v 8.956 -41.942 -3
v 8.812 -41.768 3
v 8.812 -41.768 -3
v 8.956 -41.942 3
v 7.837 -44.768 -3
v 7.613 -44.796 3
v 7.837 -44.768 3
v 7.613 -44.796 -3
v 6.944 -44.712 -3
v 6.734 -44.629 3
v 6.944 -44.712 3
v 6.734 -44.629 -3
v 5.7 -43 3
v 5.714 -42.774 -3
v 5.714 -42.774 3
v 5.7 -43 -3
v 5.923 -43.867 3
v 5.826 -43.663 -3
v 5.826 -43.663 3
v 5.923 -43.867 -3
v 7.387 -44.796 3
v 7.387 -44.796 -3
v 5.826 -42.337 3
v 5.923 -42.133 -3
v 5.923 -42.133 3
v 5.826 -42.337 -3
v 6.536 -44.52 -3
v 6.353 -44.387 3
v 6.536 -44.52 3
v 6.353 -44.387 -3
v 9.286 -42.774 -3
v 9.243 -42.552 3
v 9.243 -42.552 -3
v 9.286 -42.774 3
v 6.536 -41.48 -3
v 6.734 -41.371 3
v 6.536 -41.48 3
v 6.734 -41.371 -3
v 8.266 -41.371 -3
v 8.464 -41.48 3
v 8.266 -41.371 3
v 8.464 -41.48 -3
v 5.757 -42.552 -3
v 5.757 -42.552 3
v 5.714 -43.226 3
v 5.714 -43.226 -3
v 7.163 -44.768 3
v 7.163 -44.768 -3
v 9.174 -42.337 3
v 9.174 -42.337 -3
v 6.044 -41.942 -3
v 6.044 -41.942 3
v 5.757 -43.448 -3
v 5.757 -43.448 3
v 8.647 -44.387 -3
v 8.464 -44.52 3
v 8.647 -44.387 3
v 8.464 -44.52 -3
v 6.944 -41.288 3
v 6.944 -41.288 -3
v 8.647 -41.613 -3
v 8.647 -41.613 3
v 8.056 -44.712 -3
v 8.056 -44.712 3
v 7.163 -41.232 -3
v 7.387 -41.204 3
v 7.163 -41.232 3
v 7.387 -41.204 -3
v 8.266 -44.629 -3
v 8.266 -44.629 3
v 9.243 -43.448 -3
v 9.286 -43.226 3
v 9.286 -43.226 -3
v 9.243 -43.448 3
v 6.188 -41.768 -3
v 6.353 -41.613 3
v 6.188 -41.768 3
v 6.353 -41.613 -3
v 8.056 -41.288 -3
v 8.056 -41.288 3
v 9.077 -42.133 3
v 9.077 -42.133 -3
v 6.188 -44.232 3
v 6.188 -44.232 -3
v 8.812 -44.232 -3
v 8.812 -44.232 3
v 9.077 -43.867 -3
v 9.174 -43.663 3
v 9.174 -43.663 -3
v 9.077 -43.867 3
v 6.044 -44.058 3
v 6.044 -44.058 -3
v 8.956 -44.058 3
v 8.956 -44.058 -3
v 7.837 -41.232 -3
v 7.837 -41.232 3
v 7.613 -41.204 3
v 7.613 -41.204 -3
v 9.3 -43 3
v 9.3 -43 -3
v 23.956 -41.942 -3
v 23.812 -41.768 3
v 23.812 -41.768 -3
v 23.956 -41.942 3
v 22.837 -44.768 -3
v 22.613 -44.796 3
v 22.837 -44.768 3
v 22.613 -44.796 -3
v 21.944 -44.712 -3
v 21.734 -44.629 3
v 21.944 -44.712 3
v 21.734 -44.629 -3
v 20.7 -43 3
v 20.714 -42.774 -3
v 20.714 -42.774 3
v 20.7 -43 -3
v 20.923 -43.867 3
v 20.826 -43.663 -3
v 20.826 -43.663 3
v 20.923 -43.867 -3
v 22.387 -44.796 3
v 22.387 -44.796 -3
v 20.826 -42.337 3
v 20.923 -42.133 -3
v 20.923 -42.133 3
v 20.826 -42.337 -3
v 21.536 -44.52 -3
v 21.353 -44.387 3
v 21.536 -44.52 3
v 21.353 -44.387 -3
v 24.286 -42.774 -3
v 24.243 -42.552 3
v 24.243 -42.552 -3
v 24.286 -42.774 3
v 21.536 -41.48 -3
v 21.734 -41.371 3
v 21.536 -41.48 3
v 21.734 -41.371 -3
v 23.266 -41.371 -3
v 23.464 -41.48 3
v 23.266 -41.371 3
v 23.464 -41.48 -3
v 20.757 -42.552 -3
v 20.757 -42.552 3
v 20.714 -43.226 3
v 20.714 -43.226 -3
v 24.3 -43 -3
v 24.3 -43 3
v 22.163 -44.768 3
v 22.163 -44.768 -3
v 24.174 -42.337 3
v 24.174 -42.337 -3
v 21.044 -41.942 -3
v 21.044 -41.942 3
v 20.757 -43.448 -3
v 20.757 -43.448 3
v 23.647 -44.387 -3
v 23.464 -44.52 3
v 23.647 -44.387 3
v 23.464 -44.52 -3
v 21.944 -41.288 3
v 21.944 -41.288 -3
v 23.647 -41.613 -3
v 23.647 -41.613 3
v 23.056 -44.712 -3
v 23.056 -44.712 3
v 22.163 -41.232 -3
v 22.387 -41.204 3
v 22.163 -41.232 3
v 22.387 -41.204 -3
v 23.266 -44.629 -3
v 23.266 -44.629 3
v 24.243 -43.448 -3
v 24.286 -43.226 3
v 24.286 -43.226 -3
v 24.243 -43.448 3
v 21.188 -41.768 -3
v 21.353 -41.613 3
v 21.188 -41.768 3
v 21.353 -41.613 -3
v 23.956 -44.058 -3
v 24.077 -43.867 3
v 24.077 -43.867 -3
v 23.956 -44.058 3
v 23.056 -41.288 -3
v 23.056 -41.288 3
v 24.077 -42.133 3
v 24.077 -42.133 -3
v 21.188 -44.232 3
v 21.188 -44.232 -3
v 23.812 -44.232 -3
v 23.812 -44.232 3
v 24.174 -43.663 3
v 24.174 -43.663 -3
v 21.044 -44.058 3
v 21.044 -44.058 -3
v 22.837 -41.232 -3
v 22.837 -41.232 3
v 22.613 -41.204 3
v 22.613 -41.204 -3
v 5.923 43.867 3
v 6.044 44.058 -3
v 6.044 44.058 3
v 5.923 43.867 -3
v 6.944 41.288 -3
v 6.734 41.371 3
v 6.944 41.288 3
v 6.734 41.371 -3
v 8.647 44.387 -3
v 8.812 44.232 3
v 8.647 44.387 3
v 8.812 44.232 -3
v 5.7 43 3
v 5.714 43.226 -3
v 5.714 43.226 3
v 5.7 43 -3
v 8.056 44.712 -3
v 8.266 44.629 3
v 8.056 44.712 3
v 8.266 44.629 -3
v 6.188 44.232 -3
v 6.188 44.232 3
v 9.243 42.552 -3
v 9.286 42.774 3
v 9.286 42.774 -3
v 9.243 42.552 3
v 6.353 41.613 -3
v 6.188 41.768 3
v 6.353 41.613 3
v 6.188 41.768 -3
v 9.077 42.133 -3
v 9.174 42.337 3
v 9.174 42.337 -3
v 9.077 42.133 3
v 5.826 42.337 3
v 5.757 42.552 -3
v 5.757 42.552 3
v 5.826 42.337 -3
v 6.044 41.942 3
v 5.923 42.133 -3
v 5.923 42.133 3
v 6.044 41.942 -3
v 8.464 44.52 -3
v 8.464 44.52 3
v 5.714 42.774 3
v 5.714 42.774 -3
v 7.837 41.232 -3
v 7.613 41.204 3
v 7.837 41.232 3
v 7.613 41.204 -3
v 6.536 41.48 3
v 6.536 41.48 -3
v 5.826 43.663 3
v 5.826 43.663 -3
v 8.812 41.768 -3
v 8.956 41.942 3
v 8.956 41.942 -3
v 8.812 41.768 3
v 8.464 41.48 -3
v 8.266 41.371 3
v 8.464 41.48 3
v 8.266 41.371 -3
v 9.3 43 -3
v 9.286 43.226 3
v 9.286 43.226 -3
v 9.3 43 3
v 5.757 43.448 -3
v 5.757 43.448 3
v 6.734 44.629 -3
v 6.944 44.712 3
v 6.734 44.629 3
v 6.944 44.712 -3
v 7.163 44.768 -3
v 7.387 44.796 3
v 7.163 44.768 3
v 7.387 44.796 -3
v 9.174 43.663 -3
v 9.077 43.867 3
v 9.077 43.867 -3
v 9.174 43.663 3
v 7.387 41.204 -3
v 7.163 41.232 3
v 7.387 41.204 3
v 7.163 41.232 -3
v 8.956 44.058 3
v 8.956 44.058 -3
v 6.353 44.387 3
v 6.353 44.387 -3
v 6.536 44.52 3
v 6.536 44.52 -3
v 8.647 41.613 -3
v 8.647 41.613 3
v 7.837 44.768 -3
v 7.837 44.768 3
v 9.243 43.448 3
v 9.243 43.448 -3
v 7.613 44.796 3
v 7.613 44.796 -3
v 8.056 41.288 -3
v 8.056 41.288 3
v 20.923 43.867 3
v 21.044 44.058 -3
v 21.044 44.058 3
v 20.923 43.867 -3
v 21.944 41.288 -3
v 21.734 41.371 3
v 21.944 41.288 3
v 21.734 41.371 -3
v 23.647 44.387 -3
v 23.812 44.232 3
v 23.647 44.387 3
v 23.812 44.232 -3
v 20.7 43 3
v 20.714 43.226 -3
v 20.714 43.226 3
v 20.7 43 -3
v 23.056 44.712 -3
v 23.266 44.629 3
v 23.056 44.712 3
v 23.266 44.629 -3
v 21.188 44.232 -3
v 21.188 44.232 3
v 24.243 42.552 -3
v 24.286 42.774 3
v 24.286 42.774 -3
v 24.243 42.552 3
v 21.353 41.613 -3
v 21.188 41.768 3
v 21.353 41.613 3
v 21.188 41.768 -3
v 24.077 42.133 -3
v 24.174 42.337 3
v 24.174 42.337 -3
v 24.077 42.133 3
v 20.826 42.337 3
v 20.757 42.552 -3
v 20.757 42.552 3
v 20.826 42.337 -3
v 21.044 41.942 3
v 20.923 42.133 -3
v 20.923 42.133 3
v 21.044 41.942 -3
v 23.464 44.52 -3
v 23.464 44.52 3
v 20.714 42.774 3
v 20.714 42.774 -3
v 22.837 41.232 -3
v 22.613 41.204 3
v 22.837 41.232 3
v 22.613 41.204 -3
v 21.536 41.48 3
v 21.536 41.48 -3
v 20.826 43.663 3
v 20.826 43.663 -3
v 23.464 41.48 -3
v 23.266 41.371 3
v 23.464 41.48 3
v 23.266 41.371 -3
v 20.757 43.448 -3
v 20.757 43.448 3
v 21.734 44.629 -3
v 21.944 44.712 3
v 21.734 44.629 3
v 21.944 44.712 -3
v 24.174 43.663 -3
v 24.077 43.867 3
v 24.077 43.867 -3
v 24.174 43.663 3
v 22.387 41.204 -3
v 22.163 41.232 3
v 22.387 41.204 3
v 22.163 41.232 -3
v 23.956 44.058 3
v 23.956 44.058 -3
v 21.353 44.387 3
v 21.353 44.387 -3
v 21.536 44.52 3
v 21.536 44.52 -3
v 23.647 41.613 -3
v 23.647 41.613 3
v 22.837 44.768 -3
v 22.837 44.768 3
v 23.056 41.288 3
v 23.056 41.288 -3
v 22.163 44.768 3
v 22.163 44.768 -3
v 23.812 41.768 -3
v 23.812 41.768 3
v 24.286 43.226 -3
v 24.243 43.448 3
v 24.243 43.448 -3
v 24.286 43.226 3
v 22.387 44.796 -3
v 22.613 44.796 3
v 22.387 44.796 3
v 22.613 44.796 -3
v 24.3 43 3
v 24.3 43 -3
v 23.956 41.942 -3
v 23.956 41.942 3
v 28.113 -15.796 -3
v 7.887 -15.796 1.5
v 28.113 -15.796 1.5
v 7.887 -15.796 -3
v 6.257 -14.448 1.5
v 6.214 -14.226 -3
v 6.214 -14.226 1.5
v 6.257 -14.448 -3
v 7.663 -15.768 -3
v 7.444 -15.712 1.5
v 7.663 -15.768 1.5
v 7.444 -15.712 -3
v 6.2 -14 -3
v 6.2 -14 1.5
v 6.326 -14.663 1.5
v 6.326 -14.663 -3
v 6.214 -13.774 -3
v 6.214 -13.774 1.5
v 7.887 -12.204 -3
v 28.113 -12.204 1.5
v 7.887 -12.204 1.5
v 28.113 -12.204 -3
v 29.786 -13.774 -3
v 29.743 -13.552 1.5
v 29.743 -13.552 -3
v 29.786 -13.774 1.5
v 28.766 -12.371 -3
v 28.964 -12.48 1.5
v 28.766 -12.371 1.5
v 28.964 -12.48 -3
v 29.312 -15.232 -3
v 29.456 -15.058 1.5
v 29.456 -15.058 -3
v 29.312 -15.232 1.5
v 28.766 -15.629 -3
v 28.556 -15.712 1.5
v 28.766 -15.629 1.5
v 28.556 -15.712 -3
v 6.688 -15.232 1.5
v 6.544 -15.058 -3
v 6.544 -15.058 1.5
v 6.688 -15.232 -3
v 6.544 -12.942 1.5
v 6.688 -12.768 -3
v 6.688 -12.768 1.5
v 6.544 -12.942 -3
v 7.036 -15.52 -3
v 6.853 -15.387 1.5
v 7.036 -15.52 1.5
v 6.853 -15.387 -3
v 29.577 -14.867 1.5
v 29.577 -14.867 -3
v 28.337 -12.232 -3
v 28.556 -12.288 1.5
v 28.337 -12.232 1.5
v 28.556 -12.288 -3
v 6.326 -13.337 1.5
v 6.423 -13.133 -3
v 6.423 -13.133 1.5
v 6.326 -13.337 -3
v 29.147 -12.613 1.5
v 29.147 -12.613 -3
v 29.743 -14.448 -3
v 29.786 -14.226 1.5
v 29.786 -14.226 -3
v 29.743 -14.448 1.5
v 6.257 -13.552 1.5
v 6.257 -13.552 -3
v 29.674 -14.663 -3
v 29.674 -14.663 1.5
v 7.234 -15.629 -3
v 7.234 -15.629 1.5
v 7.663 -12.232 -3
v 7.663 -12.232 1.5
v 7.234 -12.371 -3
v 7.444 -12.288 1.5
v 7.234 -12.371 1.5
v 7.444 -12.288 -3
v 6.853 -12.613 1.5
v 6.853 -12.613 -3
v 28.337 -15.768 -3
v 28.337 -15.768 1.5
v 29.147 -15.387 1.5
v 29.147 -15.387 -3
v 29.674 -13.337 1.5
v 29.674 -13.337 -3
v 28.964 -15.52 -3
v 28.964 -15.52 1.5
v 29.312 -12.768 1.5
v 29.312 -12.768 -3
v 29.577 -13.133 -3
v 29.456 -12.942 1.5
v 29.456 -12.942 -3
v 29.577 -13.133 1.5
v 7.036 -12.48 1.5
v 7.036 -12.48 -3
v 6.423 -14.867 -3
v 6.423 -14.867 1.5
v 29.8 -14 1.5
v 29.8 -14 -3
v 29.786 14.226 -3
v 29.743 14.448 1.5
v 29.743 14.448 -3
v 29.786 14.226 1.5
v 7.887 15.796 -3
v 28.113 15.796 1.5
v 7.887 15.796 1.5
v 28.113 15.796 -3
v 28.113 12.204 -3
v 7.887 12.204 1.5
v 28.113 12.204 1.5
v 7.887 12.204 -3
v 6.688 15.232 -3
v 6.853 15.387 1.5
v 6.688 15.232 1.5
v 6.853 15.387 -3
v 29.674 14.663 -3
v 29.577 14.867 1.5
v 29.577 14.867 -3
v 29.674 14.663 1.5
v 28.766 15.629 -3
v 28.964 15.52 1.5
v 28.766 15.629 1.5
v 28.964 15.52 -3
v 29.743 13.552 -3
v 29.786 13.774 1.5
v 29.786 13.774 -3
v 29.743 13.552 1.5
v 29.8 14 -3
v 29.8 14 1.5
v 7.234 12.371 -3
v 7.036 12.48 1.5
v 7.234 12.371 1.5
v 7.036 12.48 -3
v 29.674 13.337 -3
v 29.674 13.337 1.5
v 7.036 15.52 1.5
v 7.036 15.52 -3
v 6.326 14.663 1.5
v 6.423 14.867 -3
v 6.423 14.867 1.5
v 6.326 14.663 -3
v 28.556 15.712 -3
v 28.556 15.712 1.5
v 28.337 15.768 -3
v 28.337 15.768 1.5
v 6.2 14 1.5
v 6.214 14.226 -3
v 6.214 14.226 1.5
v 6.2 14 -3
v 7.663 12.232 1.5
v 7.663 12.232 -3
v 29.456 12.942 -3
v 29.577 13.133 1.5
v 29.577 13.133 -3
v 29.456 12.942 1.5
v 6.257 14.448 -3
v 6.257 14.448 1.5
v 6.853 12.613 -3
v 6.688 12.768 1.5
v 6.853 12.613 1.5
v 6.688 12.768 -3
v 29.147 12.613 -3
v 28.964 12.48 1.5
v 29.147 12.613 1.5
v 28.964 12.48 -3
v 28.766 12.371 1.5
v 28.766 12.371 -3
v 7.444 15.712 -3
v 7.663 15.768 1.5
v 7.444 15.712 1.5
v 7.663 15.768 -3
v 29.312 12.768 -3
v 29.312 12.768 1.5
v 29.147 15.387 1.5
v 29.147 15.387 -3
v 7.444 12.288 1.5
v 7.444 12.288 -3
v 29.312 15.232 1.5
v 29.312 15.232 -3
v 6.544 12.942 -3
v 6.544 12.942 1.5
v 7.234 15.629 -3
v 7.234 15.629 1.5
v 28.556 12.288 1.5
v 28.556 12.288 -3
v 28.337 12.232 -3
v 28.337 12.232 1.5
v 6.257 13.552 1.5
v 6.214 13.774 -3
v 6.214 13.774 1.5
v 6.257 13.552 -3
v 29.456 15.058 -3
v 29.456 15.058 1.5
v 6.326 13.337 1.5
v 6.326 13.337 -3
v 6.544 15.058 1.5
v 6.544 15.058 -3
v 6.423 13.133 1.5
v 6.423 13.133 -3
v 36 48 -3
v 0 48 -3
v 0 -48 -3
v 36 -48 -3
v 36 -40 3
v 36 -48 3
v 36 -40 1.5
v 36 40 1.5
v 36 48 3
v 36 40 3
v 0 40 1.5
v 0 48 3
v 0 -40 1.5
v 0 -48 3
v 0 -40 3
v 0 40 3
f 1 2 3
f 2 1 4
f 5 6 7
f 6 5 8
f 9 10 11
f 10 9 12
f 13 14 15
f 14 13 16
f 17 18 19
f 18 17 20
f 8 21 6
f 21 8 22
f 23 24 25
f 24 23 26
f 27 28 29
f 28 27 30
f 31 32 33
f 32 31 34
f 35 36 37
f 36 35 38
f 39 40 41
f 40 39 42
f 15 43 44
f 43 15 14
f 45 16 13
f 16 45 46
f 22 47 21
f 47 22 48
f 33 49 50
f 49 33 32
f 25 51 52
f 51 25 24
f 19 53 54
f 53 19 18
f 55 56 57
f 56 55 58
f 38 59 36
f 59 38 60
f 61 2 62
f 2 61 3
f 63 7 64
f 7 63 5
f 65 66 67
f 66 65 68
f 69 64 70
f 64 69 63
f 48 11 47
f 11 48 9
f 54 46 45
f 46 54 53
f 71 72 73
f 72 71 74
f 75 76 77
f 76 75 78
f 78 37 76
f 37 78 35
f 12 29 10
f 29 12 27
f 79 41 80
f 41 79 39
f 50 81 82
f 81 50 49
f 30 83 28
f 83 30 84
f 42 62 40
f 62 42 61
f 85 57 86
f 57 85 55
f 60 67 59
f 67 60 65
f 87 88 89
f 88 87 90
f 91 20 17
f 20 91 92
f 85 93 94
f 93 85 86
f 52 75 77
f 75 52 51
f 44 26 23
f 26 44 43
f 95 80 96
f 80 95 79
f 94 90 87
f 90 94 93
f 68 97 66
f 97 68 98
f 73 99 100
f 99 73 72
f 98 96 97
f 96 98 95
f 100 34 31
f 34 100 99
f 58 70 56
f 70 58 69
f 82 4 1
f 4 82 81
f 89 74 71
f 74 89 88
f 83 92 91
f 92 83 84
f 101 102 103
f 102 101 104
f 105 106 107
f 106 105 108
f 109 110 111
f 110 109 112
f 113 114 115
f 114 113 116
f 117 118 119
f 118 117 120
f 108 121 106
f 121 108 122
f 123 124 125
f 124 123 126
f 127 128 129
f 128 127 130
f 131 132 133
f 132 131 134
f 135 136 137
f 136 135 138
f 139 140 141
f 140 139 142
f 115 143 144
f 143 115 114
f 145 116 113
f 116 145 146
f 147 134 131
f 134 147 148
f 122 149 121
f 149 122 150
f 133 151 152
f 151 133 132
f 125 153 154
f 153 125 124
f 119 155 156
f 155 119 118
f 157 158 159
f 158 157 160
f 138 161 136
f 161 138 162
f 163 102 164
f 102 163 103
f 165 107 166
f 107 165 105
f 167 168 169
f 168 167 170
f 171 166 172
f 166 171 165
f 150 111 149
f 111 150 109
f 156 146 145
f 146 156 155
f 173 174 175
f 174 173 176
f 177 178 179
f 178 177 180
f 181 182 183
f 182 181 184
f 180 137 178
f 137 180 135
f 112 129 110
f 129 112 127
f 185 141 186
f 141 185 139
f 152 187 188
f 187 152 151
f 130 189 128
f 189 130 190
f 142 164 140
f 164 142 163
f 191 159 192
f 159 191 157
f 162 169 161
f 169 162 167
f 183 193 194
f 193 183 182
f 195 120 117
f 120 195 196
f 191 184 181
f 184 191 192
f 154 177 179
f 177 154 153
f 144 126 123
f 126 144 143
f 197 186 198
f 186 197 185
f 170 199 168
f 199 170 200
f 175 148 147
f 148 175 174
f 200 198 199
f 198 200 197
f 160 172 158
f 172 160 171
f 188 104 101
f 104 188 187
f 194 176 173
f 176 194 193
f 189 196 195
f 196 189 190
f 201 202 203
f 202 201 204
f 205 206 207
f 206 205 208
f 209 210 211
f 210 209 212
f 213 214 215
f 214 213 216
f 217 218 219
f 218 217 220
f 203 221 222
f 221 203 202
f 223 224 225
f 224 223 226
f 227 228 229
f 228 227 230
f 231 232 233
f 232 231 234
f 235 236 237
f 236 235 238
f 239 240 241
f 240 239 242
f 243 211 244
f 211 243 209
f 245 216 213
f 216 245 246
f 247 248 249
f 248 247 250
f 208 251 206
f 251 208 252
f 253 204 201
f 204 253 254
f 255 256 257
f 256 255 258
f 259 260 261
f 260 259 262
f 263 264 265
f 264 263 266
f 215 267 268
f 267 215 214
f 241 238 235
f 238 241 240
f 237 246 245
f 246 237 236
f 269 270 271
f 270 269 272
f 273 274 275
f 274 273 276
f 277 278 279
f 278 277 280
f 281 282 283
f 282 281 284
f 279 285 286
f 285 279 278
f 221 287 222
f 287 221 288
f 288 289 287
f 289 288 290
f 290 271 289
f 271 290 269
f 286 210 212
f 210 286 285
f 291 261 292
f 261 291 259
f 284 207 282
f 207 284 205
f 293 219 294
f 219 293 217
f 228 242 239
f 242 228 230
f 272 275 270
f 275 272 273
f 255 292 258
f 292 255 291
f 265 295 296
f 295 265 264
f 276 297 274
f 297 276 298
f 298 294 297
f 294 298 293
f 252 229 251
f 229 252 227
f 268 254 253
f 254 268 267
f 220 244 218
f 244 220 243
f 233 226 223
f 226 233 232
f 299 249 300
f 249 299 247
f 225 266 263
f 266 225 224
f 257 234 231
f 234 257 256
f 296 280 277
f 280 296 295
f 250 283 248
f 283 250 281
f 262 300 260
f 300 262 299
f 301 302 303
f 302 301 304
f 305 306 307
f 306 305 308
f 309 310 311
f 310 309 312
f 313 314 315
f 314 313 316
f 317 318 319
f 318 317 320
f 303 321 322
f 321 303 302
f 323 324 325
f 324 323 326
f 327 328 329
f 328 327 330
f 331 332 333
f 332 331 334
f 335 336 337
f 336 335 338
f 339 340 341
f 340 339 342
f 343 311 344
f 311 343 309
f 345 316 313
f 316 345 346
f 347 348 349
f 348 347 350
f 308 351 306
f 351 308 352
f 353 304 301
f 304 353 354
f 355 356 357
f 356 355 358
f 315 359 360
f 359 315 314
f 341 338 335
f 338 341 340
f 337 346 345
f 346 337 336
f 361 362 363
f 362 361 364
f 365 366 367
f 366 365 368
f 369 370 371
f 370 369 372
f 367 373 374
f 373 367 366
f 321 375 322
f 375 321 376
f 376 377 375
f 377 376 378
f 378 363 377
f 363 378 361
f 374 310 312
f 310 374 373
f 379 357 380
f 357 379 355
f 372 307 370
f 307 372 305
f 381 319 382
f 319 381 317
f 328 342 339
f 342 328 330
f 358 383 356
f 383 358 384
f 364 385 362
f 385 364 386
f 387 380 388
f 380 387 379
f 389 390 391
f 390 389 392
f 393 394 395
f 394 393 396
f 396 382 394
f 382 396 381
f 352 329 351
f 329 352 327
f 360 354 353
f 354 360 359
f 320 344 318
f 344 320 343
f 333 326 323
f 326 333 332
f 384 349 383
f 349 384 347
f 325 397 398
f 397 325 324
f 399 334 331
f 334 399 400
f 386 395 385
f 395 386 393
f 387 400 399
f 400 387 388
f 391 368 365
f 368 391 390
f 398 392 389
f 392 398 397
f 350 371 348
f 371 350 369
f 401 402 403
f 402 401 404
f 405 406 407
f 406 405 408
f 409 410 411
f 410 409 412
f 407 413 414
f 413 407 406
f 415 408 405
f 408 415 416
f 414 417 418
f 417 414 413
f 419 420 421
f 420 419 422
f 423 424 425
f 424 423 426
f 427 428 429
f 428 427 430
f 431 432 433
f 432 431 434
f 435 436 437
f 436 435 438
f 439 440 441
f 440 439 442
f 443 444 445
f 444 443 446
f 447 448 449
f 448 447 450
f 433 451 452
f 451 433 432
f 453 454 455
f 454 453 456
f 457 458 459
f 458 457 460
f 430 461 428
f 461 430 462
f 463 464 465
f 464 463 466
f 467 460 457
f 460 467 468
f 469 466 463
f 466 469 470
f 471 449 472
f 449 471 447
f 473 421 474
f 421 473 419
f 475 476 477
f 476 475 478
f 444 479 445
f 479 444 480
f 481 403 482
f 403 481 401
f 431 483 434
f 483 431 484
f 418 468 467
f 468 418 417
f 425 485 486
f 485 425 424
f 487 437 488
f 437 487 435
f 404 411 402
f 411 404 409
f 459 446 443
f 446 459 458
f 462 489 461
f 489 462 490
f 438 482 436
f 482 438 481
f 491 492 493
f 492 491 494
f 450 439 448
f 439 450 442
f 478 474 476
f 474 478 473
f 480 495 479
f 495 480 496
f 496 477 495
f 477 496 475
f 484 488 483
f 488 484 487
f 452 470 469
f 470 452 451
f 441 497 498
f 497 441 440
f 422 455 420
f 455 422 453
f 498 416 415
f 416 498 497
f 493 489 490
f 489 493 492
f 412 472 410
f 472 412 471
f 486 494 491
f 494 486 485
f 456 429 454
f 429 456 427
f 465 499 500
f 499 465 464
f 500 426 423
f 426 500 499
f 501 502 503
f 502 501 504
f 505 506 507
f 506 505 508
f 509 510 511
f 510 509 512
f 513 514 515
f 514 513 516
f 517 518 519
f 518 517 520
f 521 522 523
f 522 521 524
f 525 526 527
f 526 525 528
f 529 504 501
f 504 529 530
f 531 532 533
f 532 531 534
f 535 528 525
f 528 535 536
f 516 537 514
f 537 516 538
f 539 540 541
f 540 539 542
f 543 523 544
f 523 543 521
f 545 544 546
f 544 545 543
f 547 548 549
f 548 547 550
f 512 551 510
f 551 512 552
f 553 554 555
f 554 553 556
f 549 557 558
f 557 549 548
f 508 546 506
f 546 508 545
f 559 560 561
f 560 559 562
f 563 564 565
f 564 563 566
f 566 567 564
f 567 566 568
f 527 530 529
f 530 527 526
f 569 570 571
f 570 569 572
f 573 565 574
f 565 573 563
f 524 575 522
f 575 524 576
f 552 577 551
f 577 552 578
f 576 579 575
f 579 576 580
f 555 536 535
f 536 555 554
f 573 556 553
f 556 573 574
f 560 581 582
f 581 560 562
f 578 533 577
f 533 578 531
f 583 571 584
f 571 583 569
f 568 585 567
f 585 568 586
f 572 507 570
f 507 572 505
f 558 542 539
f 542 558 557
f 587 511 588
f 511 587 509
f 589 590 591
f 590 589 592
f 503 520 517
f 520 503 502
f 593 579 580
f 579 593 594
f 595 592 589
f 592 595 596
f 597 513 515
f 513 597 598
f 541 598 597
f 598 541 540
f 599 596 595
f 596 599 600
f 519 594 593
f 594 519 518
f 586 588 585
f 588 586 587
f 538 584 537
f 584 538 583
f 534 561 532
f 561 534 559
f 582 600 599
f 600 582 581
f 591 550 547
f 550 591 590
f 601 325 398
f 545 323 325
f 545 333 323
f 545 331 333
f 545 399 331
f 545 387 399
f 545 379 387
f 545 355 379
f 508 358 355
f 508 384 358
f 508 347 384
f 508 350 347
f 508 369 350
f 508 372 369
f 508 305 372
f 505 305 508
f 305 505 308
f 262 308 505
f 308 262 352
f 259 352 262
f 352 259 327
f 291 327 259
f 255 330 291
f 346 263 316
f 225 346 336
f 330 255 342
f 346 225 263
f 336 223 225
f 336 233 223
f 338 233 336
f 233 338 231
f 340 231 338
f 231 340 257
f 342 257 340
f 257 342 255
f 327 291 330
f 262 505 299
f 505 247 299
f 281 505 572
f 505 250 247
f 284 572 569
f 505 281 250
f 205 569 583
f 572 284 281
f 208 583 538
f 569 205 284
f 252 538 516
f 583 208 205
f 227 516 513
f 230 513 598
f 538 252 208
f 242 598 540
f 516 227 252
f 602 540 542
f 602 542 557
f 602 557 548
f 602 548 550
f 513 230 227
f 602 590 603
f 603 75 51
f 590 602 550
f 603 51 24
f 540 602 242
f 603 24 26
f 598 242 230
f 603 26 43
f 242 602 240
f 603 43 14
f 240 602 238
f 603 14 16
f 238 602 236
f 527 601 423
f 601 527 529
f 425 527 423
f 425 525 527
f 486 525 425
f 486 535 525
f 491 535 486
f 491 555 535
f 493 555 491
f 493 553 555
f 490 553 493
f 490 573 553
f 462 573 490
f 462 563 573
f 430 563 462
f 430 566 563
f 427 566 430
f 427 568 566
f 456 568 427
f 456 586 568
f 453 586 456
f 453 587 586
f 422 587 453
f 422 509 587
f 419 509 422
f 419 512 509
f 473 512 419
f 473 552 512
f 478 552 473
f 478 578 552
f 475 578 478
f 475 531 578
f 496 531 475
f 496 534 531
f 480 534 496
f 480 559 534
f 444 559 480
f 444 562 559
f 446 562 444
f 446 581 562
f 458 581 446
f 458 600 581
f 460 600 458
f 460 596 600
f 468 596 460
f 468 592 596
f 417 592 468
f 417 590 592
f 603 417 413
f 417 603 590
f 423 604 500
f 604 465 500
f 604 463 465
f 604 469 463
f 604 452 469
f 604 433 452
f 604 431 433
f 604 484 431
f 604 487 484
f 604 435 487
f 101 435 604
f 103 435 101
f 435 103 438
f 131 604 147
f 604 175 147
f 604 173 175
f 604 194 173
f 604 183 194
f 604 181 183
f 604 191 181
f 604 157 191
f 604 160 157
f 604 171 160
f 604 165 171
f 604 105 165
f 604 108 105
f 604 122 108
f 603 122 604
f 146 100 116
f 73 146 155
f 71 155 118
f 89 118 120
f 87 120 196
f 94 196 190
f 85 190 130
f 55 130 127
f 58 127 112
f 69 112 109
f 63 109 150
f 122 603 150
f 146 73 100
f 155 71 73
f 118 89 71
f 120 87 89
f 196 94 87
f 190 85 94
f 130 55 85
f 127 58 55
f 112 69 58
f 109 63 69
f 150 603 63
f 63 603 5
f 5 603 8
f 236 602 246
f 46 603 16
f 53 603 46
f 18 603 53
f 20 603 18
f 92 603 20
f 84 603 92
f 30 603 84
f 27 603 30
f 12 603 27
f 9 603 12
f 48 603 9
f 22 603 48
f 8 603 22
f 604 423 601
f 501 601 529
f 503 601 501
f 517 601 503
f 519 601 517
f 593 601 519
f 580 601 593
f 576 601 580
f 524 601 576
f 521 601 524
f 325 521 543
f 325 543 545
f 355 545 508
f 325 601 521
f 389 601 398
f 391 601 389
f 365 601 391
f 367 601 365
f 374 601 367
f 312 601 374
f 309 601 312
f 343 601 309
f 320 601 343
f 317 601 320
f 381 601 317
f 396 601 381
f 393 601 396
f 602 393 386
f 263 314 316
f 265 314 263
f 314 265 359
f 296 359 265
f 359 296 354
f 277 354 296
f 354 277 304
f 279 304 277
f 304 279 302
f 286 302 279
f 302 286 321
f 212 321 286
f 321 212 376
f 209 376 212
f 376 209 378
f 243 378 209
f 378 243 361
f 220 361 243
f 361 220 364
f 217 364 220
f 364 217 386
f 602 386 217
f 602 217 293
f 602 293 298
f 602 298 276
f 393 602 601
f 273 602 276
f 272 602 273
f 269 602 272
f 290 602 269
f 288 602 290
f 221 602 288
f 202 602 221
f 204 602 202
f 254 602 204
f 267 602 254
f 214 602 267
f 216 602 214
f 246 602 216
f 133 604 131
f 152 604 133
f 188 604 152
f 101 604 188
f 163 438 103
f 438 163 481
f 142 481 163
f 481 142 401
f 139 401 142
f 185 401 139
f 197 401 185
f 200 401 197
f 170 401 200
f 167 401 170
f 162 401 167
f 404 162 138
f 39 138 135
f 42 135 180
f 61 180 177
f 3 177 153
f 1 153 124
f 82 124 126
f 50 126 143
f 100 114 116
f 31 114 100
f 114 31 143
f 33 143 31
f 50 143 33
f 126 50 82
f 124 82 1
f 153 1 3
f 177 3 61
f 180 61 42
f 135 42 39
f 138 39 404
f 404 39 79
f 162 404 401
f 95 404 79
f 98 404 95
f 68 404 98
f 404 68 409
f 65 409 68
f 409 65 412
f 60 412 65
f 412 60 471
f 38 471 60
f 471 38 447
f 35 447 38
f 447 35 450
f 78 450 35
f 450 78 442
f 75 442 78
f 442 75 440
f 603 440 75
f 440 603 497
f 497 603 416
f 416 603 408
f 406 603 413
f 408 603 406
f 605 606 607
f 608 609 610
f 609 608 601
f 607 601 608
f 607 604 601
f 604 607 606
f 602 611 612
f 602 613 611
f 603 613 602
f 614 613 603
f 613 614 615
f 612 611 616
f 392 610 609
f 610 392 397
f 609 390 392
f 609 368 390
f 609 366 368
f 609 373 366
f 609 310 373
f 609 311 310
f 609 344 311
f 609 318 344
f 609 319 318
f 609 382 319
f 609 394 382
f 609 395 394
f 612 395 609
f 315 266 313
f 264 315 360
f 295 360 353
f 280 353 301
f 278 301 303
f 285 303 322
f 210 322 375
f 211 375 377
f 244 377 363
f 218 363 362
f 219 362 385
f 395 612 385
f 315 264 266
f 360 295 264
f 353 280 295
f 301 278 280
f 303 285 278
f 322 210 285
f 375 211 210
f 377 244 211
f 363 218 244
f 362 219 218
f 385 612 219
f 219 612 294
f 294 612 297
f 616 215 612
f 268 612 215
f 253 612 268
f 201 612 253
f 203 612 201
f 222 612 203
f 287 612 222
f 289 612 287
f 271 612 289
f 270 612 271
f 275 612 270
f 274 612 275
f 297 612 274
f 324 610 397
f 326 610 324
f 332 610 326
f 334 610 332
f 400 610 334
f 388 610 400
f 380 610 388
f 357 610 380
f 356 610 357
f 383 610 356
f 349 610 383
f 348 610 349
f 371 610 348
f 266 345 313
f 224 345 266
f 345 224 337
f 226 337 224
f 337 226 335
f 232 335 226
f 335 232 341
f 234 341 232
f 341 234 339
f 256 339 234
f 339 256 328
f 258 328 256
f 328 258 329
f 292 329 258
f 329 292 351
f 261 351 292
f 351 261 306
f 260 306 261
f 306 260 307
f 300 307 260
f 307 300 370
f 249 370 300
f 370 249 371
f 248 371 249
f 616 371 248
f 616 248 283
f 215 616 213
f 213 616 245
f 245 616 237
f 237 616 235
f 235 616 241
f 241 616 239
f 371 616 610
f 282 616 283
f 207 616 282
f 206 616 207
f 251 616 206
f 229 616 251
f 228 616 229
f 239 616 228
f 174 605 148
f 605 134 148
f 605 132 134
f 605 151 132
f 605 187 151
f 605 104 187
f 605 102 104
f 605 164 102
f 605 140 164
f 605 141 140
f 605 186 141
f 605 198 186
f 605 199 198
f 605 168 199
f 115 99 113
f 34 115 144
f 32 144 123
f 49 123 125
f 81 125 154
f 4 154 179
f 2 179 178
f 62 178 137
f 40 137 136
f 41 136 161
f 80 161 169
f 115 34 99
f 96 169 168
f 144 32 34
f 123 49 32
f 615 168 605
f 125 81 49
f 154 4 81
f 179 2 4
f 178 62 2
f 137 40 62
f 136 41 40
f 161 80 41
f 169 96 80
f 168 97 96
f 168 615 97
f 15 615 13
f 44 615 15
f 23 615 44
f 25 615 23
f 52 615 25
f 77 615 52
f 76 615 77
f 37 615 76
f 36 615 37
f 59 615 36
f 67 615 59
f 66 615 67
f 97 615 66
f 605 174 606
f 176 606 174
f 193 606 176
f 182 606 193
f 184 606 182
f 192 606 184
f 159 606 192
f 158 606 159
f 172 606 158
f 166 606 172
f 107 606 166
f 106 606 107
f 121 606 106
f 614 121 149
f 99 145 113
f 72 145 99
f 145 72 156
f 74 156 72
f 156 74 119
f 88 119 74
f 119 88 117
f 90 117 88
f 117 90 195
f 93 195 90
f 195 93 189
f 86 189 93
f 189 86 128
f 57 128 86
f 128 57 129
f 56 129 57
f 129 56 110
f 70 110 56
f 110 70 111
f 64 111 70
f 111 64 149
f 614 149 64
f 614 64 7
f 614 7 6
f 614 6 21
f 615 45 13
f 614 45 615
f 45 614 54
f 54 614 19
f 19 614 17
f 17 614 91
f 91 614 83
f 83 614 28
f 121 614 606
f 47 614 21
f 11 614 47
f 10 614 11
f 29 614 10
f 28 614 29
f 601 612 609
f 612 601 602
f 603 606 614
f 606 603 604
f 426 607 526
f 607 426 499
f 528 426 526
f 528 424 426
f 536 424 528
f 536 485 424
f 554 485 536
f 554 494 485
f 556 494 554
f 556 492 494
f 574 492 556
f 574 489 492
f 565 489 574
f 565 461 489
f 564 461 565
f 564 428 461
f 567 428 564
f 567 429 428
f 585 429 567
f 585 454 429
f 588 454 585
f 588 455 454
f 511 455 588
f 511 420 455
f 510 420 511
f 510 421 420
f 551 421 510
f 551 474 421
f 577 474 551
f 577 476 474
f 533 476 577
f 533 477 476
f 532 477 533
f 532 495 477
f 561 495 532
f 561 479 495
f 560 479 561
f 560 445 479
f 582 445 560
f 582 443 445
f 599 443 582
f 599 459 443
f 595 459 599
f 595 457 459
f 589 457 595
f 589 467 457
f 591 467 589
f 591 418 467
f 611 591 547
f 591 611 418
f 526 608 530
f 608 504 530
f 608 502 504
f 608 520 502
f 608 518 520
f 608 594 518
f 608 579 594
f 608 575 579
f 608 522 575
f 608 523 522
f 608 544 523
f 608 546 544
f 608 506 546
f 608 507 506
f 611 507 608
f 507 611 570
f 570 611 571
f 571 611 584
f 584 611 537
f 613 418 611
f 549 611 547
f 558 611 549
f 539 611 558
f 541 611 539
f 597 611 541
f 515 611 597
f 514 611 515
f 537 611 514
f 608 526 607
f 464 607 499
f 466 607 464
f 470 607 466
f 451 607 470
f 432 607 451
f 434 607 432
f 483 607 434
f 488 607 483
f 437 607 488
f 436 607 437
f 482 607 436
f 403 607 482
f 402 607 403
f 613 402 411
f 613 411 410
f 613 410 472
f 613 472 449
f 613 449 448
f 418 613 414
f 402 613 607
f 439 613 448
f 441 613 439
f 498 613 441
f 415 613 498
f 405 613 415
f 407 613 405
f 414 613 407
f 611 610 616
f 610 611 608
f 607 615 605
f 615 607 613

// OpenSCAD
/********************************************************
This file is part of the RepRapPNP project, developed at the University of Hamburg.

It heavily relies on the work by Jonas and Simon Kühling for the RepRap-Industrial design.

Author: Florens Wasserfall <wasserfall@kalanka.de> 
License: 'GNU Affero General Public License AGPLv3 http://www.gnu.org/licenses/agpl.html' 
*******************************************************/

$fn=50;

// render
rotate([0, 90, 0]) camera_clip();

module camera_clip() {
	difference() {
		// mount screws for printer
		translate([0, 0, 18]) cube(size=[6, 96, 36], center=true);
		for(i=[-1,1]){
			for(k=[-1, 1]) {
				translate([0, i*43, 15+k*7.5]) rotate([0, 90, 0]) cylinder(r=1.8, h=20, center=true);
			}
		}

		// space for camera
		translate([-3, 0, 18]) cube(size=[3, 80, 40], center=true);

		//mount screws for camera
		for(i=[-1, 1]) {
			hull() {
				for(k=[0, 1]) { 
		   			translate([0, i*(28/2), 8+k*20]) rotate([0, 90, 0]) cylinder(r=1.8, h=20, center=true);
		   		}
		   	}
		}
	}
}
